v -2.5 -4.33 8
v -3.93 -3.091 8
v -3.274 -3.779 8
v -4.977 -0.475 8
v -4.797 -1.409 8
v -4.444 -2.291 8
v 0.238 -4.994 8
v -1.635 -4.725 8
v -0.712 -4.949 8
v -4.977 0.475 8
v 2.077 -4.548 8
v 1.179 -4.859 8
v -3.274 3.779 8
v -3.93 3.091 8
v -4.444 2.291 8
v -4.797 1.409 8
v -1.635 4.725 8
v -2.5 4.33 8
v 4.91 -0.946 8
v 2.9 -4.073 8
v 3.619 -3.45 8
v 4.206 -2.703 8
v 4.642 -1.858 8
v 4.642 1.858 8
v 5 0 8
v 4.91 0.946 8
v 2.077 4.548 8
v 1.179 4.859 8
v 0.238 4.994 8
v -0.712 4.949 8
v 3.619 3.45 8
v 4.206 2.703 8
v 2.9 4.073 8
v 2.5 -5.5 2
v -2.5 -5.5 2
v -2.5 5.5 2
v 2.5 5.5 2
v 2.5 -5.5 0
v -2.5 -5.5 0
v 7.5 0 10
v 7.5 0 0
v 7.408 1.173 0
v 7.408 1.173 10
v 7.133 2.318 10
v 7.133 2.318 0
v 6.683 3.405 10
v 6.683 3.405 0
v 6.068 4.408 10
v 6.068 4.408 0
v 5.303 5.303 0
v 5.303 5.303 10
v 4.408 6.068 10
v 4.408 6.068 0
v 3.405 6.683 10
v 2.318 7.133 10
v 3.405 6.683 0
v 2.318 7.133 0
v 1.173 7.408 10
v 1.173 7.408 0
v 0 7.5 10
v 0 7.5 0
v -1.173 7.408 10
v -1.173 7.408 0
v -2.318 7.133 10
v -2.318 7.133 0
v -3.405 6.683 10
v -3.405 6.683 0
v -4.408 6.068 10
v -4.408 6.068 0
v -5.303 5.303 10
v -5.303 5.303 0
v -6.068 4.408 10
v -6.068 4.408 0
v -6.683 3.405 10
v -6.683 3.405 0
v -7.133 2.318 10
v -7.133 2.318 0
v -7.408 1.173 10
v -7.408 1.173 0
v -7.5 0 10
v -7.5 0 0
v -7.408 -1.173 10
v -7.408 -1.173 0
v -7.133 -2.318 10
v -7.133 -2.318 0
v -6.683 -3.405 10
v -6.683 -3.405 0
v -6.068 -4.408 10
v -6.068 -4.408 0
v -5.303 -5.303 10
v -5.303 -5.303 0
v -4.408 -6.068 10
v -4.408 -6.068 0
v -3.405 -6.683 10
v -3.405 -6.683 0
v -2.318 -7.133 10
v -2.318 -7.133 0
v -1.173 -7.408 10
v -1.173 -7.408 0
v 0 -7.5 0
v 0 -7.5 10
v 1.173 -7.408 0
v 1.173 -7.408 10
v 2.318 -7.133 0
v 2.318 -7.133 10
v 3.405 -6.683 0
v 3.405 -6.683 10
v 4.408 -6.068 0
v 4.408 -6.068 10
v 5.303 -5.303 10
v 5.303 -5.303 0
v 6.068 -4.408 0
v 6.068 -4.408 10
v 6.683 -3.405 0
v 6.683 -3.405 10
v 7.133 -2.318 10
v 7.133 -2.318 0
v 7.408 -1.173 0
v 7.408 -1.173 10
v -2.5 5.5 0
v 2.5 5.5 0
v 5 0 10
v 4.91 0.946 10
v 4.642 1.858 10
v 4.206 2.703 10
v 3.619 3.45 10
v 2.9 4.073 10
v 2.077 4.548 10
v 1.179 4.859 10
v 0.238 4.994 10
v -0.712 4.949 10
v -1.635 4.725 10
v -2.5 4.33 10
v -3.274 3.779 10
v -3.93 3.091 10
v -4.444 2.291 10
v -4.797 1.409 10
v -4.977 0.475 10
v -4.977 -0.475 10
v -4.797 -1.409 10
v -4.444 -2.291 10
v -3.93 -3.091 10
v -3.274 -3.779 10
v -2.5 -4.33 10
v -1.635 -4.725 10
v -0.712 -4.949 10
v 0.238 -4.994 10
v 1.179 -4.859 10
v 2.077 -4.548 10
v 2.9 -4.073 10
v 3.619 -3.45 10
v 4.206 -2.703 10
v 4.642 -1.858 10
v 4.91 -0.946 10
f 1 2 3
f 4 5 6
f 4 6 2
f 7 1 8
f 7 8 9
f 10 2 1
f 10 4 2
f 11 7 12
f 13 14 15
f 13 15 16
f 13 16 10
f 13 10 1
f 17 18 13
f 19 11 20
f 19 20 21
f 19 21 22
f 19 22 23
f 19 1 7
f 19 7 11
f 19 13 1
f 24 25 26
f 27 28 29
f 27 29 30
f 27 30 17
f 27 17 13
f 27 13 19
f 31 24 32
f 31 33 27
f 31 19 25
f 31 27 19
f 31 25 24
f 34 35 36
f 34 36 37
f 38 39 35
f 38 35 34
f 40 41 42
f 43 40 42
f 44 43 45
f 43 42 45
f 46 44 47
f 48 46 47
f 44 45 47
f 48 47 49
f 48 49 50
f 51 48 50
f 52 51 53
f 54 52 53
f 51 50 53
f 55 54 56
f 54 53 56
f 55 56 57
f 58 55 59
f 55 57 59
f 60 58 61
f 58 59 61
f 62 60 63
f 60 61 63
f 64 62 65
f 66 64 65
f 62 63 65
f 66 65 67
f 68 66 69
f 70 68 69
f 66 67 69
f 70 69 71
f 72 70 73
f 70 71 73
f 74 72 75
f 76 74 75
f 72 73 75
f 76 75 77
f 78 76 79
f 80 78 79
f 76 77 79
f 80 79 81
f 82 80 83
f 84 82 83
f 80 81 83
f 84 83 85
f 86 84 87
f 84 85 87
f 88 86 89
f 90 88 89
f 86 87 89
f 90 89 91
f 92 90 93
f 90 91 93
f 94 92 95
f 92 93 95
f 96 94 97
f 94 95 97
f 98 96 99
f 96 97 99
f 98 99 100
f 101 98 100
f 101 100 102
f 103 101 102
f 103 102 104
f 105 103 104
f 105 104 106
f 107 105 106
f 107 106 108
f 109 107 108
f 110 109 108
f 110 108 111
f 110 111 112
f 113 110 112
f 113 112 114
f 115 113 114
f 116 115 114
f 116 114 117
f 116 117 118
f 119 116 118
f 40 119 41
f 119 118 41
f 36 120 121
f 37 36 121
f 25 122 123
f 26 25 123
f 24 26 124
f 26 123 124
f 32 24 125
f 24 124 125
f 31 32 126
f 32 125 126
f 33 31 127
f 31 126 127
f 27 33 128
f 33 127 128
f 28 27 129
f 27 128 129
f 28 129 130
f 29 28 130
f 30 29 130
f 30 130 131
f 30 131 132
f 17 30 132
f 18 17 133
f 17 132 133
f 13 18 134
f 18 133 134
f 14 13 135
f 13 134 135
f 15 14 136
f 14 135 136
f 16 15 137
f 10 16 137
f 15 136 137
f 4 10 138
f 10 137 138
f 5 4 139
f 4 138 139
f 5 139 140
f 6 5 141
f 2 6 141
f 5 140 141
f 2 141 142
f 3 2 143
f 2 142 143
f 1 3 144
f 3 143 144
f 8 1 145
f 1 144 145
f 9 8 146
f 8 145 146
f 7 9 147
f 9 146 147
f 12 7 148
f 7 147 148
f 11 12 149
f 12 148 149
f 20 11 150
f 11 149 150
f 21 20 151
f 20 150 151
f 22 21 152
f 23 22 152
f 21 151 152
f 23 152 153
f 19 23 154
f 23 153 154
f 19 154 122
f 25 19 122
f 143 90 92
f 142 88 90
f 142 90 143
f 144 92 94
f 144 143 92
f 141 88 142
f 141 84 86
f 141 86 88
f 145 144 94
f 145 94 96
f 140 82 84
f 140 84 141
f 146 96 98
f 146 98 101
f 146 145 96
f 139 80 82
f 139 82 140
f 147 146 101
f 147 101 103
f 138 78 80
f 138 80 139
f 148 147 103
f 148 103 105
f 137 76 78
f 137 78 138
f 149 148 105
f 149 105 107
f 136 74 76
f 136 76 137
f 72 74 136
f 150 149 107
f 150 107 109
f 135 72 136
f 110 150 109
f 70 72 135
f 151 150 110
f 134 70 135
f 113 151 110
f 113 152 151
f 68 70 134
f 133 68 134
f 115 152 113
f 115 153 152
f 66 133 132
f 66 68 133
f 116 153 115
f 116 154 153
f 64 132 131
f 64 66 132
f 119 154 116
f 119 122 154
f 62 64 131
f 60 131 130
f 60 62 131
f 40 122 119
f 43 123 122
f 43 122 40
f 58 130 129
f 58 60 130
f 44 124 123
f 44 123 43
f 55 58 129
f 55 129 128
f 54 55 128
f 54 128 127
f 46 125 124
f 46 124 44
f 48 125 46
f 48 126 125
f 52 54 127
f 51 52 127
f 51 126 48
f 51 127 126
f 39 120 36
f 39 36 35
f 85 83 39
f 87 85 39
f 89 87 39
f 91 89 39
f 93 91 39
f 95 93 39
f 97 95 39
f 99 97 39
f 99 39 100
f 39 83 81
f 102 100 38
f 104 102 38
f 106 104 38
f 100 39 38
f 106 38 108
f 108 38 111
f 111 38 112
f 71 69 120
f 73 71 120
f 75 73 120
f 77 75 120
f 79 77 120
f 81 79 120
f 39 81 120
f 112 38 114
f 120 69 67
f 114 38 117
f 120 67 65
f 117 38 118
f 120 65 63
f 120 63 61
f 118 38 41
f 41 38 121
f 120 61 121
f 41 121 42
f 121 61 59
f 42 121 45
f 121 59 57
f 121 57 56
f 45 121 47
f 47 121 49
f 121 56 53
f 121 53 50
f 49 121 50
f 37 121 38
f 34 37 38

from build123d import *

# Parameters (mm, degrees)
SKETCH_R        = 7.5
PAD_DEPTH       = 10
SKETCH001_W     = 5
SKETCH001_H     = 11
POCKET_DEPTH    = 2
SKETCH002_R     = 5
POCKET001_DEPTH = 2


with BuildPart() as part:
    # Sketch → Pad (new body)
    with BuildSketch(Plane.XY):
        Circle(SKETCH_R)
    extrude(amount=PAD_DEPTH)

    # Sketch001 (on Face2 of Pad) → Pocket (cut)
    with BuildSketch(Plane(origin=(0, 0, 0), x_dir=(1, 0, 0), z_dir=(0, 0, -1))):
        Rectangle(SKETCH001_W, SKETCH001_H)
    extrude(amount=-POCKET_DEPTH, mode=Mode.SUBTRACT)

    # Sketch002 (on Face3 of Pocket) → Pocket001 (cut)
    with BuildSketch(Plane.XY.offset(10)):
        Circle(SKETCH002_R)
    extrude(amount=-POCKET001_DEPTH, mode=Mode.SUBTRACT)


solid = part.part
